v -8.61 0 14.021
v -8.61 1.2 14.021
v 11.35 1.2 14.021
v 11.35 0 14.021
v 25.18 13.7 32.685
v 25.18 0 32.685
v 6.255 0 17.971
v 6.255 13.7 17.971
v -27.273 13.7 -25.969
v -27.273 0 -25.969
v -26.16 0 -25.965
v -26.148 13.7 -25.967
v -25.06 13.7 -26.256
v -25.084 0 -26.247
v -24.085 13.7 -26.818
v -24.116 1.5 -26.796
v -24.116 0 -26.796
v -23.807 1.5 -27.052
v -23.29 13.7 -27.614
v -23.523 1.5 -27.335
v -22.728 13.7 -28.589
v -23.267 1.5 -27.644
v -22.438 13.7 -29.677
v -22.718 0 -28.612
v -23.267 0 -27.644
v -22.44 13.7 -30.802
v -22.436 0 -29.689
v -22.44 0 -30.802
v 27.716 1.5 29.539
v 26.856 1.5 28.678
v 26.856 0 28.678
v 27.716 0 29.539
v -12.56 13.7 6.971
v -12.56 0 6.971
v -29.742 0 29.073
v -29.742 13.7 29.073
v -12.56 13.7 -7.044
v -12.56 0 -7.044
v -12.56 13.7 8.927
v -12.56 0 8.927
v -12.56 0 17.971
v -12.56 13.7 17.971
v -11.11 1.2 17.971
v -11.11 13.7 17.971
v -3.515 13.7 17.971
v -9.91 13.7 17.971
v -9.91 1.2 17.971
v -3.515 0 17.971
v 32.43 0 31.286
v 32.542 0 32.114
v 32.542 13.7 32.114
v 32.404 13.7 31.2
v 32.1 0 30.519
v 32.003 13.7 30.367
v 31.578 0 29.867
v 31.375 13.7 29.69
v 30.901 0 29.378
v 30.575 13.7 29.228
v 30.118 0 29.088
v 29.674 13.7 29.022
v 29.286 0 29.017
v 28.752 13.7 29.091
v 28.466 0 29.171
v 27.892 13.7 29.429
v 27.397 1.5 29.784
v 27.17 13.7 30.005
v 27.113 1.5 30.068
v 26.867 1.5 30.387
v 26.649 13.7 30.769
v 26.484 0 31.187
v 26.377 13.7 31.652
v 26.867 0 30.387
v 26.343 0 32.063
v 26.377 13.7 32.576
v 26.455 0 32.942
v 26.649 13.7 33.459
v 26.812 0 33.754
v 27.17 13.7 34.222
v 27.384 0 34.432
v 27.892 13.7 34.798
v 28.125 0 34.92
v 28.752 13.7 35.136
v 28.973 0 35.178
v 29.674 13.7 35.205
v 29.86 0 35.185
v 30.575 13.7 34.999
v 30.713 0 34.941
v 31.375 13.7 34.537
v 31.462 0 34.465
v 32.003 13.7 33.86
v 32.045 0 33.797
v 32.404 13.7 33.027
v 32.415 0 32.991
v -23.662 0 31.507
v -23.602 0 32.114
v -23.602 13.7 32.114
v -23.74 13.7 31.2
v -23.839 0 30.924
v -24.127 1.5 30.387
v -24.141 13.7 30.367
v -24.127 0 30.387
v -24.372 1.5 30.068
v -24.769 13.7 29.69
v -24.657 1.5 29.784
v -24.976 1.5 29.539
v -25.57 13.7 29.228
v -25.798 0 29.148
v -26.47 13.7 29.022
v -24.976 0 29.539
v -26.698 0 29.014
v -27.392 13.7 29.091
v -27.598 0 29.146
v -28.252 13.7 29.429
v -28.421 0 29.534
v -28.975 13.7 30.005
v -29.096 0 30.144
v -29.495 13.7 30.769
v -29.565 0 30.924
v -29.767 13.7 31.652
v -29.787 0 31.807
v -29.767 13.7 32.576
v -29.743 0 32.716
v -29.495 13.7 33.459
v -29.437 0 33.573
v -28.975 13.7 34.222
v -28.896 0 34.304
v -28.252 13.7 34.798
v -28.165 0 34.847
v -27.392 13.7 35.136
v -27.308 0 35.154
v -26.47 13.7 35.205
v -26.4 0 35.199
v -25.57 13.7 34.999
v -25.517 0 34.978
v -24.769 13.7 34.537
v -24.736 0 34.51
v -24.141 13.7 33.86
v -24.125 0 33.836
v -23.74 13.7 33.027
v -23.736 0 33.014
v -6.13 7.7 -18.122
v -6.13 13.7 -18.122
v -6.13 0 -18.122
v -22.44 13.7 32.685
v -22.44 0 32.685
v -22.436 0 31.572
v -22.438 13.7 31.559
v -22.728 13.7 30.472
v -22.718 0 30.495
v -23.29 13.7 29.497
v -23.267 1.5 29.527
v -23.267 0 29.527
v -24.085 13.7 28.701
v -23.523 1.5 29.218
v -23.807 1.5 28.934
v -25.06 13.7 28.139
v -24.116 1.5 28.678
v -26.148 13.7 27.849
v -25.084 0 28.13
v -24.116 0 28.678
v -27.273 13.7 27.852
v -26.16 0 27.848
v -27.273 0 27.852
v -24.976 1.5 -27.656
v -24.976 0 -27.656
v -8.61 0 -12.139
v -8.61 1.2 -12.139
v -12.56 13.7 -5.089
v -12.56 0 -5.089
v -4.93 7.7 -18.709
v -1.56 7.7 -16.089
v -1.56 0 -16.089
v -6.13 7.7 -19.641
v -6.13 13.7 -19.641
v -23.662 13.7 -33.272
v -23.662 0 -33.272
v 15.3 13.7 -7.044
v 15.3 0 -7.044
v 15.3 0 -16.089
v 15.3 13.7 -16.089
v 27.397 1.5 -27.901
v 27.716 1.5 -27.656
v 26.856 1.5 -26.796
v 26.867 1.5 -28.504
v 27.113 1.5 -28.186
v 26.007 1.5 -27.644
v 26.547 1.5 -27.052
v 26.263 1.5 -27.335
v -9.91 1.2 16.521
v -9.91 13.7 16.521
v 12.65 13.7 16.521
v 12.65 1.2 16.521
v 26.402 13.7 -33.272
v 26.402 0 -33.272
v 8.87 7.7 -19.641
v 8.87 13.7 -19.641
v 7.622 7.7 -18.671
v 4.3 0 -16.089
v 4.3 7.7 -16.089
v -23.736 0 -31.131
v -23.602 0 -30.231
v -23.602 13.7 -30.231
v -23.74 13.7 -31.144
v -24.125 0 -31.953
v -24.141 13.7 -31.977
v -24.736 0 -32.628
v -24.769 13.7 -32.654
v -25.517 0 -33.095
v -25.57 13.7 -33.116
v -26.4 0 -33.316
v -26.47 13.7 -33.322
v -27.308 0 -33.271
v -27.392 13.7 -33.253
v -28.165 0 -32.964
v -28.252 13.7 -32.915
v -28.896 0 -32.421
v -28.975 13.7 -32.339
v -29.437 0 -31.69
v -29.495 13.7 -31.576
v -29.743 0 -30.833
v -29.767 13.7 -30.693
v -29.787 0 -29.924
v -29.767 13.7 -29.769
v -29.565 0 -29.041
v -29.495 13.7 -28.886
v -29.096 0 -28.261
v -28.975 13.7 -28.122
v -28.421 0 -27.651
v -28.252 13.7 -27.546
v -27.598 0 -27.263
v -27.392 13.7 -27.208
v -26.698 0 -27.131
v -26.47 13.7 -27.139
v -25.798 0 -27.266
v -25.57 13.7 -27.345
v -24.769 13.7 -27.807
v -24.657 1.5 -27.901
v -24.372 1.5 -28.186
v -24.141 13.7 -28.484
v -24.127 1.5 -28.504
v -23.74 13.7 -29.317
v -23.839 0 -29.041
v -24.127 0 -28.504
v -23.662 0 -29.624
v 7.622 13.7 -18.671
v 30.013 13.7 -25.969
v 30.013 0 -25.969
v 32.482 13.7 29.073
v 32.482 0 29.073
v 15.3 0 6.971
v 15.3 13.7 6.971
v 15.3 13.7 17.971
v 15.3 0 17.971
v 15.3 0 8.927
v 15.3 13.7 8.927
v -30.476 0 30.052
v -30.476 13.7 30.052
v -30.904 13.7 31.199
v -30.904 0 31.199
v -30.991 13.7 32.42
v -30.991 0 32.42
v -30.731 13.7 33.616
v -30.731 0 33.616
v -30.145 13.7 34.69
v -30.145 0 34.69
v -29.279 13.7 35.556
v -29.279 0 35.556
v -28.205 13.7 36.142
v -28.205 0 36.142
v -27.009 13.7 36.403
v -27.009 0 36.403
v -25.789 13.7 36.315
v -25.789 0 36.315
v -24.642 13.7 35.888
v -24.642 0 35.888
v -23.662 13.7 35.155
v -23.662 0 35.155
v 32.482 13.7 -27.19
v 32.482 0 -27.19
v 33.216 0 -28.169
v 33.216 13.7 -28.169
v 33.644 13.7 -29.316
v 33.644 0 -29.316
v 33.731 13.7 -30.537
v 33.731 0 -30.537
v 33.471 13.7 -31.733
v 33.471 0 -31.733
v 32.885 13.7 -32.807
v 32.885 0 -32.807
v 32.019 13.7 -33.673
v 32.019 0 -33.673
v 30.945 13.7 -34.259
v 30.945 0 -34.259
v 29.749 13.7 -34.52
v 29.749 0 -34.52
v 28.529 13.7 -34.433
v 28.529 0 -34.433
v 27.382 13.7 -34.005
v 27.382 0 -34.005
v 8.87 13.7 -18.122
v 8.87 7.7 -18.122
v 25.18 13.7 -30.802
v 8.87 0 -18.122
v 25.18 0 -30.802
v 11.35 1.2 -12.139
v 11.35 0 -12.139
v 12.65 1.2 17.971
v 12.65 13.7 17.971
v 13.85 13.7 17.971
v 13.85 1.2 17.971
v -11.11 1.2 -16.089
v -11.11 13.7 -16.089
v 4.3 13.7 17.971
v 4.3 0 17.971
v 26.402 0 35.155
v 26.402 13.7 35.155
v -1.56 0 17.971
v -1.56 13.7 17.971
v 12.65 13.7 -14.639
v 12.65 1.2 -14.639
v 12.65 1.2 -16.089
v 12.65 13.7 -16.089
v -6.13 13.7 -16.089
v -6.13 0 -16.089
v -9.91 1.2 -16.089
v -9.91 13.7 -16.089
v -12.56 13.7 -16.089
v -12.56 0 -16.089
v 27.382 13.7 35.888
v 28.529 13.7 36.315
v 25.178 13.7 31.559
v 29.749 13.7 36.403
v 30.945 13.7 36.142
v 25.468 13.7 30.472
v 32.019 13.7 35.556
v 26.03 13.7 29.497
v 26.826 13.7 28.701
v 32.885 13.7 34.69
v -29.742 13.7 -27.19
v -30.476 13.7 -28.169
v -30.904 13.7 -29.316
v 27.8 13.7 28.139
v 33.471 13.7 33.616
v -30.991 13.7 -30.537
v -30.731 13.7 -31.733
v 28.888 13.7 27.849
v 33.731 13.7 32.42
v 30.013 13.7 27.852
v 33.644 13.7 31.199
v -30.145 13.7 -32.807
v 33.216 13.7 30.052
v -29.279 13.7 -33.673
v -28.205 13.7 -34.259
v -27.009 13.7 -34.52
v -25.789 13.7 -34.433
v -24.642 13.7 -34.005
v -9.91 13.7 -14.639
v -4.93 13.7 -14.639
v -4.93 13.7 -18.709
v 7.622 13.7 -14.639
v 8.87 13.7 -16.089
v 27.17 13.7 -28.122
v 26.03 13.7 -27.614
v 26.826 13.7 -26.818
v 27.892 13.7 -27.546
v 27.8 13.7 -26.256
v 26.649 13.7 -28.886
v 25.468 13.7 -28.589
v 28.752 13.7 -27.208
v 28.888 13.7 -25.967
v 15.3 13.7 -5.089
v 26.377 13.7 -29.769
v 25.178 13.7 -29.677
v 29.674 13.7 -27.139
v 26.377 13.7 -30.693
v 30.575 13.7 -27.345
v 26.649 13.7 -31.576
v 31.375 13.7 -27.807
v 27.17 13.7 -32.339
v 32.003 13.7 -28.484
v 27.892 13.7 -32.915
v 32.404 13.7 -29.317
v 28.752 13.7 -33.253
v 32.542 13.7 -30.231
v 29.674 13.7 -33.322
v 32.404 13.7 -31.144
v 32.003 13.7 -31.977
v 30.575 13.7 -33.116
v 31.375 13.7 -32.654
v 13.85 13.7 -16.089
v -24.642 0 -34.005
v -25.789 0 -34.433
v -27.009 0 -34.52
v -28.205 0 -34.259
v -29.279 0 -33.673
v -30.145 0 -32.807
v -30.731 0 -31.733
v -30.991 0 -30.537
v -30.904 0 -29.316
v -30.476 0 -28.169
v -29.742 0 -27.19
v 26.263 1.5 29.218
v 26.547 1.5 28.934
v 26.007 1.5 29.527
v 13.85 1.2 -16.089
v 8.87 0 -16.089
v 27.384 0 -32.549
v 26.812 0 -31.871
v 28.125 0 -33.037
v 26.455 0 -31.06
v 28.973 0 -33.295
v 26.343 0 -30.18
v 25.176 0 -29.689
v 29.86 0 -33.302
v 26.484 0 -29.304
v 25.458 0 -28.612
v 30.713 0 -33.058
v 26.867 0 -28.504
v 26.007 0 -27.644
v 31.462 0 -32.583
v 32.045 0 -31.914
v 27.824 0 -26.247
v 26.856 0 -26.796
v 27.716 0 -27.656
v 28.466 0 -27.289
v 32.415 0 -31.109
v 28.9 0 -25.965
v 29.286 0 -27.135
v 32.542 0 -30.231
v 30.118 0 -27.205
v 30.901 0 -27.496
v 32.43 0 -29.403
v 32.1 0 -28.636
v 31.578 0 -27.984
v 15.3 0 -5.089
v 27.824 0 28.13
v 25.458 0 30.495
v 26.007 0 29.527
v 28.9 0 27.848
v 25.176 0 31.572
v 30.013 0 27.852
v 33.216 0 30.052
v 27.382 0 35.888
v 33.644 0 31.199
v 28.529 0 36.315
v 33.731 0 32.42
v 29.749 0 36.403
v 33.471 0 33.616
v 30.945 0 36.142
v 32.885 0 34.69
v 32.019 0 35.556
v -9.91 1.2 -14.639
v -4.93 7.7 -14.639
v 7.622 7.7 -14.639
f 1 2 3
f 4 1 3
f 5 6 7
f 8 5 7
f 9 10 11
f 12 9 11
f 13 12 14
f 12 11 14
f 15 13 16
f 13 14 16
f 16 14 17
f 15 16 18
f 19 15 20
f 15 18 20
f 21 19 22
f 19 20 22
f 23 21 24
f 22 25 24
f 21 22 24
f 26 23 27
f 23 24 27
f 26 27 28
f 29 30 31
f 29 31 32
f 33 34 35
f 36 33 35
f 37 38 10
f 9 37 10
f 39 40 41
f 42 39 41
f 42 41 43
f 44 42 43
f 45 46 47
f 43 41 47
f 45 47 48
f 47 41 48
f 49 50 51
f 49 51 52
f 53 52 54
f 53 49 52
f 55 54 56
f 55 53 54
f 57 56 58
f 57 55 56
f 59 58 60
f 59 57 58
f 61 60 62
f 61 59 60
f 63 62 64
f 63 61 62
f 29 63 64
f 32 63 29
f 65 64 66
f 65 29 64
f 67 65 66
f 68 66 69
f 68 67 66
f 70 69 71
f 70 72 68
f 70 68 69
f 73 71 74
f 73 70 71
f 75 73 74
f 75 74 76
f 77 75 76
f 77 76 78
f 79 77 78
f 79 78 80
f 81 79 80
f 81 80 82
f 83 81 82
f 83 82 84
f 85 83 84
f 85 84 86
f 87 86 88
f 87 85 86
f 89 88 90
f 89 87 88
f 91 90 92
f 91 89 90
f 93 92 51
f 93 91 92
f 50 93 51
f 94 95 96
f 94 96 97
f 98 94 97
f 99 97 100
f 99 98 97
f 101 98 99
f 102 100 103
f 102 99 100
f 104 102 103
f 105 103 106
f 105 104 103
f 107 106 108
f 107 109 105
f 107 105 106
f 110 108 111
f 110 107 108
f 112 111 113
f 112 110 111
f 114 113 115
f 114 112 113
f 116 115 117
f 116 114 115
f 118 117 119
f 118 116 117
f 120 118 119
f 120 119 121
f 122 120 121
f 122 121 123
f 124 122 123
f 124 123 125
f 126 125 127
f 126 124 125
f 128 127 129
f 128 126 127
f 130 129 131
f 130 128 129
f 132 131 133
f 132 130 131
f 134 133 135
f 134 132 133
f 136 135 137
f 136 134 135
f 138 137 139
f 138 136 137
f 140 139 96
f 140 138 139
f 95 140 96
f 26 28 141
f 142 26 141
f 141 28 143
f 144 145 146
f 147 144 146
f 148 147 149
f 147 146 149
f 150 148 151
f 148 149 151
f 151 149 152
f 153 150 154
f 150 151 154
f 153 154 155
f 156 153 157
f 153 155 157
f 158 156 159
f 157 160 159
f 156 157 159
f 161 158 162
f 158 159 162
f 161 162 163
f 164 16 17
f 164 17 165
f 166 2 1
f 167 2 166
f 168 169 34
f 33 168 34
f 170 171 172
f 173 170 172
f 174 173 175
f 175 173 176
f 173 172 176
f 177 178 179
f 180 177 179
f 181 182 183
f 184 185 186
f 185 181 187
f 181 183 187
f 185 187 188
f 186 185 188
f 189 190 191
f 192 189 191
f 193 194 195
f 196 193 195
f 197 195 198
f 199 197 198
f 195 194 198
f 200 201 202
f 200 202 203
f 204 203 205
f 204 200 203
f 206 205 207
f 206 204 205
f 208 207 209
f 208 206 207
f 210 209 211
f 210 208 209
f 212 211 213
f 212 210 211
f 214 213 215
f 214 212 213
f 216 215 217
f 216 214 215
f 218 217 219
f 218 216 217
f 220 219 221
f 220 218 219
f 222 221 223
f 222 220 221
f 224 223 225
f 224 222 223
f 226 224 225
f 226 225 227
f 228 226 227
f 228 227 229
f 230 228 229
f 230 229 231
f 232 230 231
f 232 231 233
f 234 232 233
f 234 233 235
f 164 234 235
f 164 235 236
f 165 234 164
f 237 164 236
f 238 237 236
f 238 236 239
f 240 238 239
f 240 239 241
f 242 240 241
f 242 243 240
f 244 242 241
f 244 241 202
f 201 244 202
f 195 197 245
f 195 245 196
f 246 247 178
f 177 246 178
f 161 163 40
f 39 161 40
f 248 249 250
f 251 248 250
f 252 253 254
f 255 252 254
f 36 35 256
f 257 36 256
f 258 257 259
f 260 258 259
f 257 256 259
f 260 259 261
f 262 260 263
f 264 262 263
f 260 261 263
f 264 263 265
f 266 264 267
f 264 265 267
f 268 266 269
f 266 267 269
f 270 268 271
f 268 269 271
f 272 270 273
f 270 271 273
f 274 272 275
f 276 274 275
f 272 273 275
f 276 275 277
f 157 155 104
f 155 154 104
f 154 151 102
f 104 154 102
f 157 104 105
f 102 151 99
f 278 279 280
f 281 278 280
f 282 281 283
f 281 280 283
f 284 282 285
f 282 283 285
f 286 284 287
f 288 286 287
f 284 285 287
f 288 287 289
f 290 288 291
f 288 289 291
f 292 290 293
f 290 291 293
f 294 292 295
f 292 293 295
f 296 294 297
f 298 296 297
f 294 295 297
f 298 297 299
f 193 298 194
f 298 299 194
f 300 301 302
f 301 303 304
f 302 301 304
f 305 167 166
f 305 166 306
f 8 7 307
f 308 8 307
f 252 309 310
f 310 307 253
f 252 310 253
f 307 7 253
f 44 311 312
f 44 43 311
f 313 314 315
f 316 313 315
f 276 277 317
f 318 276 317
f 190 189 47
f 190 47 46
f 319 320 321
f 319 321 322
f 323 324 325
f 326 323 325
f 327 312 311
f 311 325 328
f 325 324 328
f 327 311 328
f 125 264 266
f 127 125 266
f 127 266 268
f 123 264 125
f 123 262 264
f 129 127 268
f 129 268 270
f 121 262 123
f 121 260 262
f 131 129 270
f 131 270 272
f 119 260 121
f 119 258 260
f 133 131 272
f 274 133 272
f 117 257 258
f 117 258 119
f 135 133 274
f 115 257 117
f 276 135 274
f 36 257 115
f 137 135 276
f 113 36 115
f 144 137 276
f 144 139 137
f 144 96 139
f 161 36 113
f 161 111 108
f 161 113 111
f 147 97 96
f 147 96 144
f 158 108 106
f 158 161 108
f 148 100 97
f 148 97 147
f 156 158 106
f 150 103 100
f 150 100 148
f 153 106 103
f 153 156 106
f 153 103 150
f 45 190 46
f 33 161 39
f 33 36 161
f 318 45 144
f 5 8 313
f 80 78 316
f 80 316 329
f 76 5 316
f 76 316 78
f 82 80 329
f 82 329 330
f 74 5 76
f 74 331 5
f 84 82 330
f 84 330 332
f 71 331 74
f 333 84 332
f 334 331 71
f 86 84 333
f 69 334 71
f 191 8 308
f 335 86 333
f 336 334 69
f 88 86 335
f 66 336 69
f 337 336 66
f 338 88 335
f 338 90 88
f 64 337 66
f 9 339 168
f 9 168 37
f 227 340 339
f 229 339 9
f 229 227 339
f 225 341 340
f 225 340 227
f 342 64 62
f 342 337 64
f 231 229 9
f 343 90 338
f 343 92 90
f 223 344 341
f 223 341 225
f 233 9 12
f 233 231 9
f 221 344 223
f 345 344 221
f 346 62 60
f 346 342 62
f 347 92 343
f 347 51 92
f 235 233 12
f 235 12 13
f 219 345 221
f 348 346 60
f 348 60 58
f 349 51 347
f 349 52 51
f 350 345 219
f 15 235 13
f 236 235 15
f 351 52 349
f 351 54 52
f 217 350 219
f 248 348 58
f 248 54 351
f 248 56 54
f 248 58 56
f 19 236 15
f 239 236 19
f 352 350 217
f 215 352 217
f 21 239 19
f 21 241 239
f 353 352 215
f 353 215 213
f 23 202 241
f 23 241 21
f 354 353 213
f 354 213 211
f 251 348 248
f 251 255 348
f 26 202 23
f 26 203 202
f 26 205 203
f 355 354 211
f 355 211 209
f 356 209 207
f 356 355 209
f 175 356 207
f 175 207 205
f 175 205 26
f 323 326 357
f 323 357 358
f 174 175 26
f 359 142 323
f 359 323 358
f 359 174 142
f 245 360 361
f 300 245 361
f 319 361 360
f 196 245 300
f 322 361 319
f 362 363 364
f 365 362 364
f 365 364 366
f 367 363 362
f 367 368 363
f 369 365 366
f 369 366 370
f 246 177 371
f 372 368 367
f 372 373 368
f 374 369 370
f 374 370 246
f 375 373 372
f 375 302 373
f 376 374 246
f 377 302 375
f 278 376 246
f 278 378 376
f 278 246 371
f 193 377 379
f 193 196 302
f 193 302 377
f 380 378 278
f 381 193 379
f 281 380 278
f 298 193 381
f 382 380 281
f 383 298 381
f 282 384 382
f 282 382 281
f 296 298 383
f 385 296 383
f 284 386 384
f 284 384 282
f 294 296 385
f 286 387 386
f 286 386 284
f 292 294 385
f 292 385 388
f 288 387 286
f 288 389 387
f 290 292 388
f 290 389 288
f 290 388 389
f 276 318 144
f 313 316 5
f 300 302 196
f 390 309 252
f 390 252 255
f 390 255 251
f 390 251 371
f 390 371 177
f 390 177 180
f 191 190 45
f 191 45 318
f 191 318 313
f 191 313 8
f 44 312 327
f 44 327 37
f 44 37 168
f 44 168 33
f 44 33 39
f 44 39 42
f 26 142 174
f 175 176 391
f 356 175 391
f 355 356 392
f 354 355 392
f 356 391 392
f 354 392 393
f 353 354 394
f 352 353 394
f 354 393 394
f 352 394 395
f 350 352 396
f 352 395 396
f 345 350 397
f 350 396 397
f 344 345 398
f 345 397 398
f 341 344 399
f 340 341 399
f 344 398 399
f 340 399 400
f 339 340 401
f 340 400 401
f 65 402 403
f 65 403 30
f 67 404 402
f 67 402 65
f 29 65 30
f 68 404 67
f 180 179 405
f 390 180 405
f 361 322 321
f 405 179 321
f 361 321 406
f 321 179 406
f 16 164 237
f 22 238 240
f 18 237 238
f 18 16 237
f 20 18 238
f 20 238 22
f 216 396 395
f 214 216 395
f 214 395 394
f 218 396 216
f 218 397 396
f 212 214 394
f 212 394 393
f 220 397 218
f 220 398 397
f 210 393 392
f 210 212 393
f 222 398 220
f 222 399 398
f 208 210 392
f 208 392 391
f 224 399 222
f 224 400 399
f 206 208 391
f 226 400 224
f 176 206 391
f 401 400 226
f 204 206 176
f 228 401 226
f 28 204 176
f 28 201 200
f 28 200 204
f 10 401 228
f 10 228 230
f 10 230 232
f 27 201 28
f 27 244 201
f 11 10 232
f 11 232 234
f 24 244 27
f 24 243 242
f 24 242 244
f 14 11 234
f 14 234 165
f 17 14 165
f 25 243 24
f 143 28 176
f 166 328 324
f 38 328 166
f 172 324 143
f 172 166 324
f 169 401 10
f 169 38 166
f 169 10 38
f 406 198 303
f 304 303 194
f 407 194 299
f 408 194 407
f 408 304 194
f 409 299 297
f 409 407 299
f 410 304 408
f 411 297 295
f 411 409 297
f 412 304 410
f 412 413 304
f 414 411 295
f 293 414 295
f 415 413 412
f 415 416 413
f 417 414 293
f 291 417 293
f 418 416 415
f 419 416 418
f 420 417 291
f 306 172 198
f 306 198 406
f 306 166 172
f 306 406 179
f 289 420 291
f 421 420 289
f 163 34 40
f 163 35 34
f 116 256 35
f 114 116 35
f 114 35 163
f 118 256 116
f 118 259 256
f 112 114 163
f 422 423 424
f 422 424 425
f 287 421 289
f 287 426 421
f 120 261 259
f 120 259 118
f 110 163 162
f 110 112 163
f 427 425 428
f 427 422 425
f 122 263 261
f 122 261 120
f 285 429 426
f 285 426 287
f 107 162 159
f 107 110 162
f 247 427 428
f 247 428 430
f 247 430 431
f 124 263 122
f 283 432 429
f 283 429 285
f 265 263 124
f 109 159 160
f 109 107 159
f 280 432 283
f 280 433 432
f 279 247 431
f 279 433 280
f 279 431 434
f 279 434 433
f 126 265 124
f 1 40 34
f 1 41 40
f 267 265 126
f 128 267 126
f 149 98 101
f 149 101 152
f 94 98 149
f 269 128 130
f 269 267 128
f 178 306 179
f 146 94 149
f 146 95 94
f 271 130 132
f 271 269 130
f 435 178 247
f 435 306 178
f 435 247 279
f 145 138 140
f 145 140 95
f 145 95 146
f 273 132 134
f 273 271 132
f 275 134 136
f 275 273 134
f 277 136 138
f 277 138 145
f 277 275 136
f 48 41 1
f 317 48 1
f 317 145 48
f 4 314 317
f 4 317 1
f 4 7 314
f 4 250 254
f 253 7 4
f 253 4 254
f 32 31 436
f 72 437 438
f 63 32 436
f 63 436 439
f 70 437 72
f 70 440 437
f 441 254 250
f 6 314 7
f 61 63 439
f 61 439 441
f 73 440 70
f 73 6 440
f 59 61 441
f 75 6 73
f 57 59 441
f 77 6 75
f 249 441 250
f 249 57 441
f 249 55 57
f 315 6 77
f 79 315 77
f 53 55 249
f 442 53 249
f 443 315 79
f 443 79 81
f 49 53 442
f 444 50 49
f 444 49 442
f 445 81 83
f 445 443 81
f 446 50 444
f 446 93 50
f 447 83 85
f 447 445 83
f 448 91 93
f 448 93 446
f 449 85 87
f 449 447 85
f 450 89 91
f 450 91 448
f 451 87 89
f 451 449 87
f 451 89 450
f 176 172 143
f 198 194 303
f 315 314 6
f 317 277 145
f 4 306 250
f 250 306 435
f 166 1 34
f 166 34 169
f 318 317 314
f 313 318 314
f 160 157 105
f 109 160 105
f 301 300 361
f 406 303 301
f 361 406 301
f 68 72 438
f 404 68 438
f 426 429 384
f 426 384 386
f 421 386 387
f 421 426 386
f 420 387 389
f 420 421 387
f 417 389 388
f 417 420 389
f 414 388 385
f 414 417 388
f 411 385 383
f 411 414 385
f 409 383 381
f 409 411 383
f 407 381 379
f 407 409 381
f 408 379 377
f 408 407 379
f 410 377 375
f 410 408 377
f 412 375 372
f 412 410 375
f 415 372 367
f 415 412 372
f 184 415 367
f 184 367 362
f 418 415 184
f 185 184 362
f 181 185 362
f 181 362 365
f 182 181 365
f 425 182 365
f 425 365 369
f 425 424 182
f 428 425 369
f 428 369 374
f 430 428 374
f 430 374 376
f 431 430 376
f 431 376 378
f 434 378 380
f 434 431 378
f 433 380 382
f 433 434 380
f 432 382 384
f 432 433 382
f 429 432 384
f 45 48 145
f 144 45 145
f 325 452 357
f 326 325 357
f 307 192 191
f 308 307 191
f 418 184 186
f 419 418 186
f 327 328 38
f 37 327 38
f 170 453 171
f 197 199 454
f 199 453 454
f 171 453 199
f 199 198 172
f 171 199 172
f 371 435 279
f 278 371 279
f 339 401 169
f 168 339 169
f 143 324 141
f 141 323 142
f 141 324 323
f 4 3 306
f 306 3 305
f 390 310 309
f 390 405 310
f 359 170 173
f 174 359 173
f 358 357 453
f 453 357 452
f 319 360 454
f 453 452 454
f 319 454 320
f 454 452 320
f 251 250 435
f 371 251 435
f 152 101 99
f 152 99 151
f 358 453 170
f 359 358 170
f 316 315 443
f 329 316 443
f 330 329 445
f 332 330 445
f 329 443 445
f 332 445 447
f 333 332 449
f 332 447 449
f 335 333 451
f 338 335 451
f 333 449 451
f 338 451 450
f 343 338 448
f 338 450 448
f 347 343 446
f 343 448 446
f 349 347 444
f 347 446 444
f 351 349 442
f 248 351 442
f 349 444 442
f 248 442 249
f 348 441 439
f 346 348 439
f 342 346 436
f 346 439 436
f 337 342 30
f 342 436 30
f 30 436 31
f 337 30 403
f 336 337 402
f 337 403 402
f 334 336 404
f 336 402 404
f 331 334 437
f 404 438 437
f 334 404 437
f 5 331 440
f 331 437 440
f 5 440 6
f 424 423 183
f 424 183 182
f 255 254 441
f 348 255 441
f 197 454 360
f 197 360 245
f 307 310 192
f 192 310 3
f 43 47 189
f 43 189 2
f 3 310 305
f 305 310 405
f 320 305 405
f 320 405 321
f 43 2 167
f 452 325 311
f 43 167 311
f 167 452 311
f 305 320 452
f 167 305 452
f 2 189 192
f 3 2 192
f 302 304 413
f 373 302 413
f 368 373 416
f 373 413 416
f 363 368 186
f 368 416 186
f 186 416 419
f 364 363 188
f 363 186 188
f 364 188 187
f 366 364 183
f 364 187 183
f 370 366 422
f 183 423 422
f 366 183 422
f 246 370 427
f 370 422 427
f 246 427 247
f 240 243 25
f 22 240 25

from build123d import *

# Parameters (mm, degrees)
SKETCH1_R           = 3.1
BOSS_EXTRUDE4_DEPTH = 13.7
SKETCH6_W           = 24.96
SKETCH6_H           = 31.16
CUT_EXTRUDE1_DEPTH  = 12.5
SKETCH7_W           = 19.96
SKETCH7_H           = 26.16
CUT_EXTRUDE2_DEPTH  = 12.5
SKETCH9_W           = 1.2
SKETCH9_H           = 12.5
CUT_EXTRUDE3_DEPTH  = 1.45
SKETCH10_W          = 1.2
SKETCH10_H          = 12.5
CUT_EXTRUDE4_DEPTH  = 1.45
CUT_EXTRUDE5_DEPTH  = 1.5
SKETCH12_W          = 7.5
SKETCH12_H          = 6
CUT_EXTRUDE6_DEPTH  = 20.892135624
BOSS_EXTRUDE5_DEPTH = 6
BOSS_EXTRUDE6_DEPTH = 7.7


with BuildPart() as part:
    # Sketch1 → Boss-Extrude4 (new body)
    with BuildSketch(Plane(origin=(0, 0, 0), x_dir=(1, 0, 0), z_dir=(0, 1, 0))):
        with BuildLine():
            Line((-1.559985024, 16.088570711), (-23.661955043, 33.271658997))
            ThreePointArc((-23.661955043, 33.271658997), (-29.74307331, 33.27087194), (-29.742286254, 27.189753673))
            Line((-29.742286254, 27.189753673), (-12.559985024, 5.088570711))
            Line((-12.559985024, 5.088570711), (-12.559985024, -6.971429289))
            Line((-12.559985024, -6.971429289), (-29.742286254, -29.072612251))
            ThreePointArc((-29.742286254, -29.072612251), (-29.74307331, -35.153730518), (-23.661955043, -35.154517574))
            Line((-23.661955043, -35.154517574), (-1.559985024, -17.971429289))
            Line((-1.559985024, -17.971429289), (4.300014976, -17.971429289))
            Line((4.300014976, -17.971429289), (26.401984994, -35.154517574))
            ThreePointArc((26.401984994, -35.154517574), (32.483103261, -35.153730518), (32.482316205, -29.072612251))
            Line((32.482316205, -29.072612251), (15.300014976, -6.971429289))
            Line((15.300014976, -6.971429289), (15.300014976, 5.088570711))
            Line((15.300014976, 5.088570711), (32.482316205, 27.189753673))
            ThreePointArc((32.482316205, 27.189753673), (32.483103261, 33.27087194), (26.401984994, 33.271658997))
            Line((26.401984994, 33.271658997), (4.300014976, 16.088570711))
            Line((4.300014976, 16.088570711), (-1.559985024, 16.088570711))
        make_face()
        with BuildLine():
            Line((15.300014976, -17.971429289), (15.300014976, -8.926547914))
            Line((15.300014976, -8.926547914), (30.013101167, -27.851638652))
            ThreePointArc((30.013101167, -27.851638652), (26.40152787, -29.073069325), (25.180248217, -32.684693693))
            Line((25.180248217, -32.684693693), (6.255121178, -17.971429289))
            Line((6.255121178, -17.971429289), (15.300014976, -17.971429289))
        make_face(mode=Mode.SUBTRACT)
        with Locations((-26.702120648, -32.113564912)):
            Circle(SKETCH1_R, mode=Mode.SUBTRACT)
        with BuildLine():
            Line((-12.559985024, -8.926547914), (-12.559985024, -17.971429289))
            Line((-12.559985024, -17.971429289), (-3.515091227, -17.971429289))
            Line((-3.515091227, -17.971429289), (-22.440218266, -32.684693693))
            ThreePointArc((-22.440218266, -32.684693693), (-23.661497919, -29.073069325), (-27.273071216, -27.851638652))
            Line((-27.273071216, -27.851638652), (-12.559985024, -8.926547914))
        make_face(mode=Mode.SUBTRACT)
        with BuildLine():
            Line((-3.515091227, 16.088570711), (-12.559985024, 16.088570711))
            Line((-12.559985024, 16.088570711), (-12.559985024, 7.043689336))
            Line((-12.559985024, 7.043689336), (-27.273071216, 25.968780075))
            ThreePointArc((-27.273071216, 25.968780075), (-23.661497919, 27.190210747), (-22.440218266, 30.801835115))
            Line((-22.440218266, 30.801835115), (-3.515091227, 16.088570711))
        make_face(mode=Mode.SUBTRACT)
        with Locations((-26.702120648, 30.230706335)):
            Circle(SKETCH1_R, mode=Mode.SUBTRACT)
        with BuildLine():
            Line((15.300014976, 7.043689336), (15.300014976, 16.088570711))
            Line((15.300014976, 16.088570711), (6.255121178, 16.088570711))
            Line((6.255121178, 16.088570711), (25.180248217, 30.801835115))
            ThreePointArc((25.180248217, 30.801835115), (26.40152787, 27.190210747), (30.013101167, 25.968780075))
            Line((30.013101167, 25.968780075), (15.300014976, 7.043689336))
        make_face(mode=Mode.SUBTRACT)
        with Locations((29.442150599, 30.230706335)):
            Circle(SKETCH1_R, mode=Mode.SUBTRACT)
        with Locations((29.442150599, -32.113564912)):
            Circle(SKETCH1_R, mode=Mode.SUBTRACT)
    extrude(amount=BOSS_EXTRUDE4_DEPTH)

    # Sketch6 → Cut-Extrude1 (cut)
    with BuildSketch(Plane(origin=(0, 13.7, 0), x_dir=(1, 0, 0), z_dir=(0, 1, 0))):
        with Locations((1.370014976, -0.941429289)):
            Rectangle(SKETCH6_W, SKETCH6_H)
    extrude(amount=-CUT_EXTRUDE1_DEPTH, mode=Mode.SUBTRACT)

    # Sketch7 → Cut-Extrude2 (cut)
    with BuildSketch(Plane(origin=(0, 1.2, 0), x_dir=(1, 0, 0), z_dir=(0, 1, 0))):
        with Locations((1.370014976, -0.941429289)):
            Rectangle(SKETCH7_W, SKETCH7_H)
    extrude(amount=-CUT_EXTRUDE2_DEPTH, mode=Mode.SUBTRACT)

    # Sketch9 → Cut-Extrude3 (cut)
    with BuildSketch(Plane.XY.offset(-14.638570711)):
        with Locations((-10.509985024, 7.45)):
            Rectangle(SKETCH9_W, SKETCH9_H)
        with Locations((13.250014976, 7.45)):
            Rectangle(SKETCH9_W, SKETCH9_H)
    extrude(amount=-CUT_EXTRUDE3_DEPTH, mode=Mode.SUBTRACT)

    # Sketch10 → Cut-Extrude4 (cut)
    with BuildSketch(Plane(origin=(0, 0, 16.521429289), x_dir=(-1, 0, 0), z_dir=(0, 0, -1))):
        with Locations((-13.250014976, 7.45)):
            Rectangle(SKETCH10_W, SKETCH10_H)
        with Locations((10.509985024, 7.45)):
            Rectangle(SKETCH10_W, SKETCH10_H)
    extrude(amount=-CUT_EXTRUDE4_DEPTH, mode=Mode.SUBTRACT)

    # Sketch11 → Cut-Extrude5 (cut)
    with BuildSketch(Plane.XZ):
        Polygon((-26.881022326, -29.561079875), (-26.032494188, -30.409608013), (-22.146132163, -26.523245987), (-22.9946603, -25.67471785), align=None)
        Polygon((24.886162114, -26.523245987), (25.734690251, -25.67471785), (29.621052277, -29.561079875), (28.772524139, -30.409608013), align=None)
        Polygon((29.621052277, 31.443938453), (28.772524139, 32.29246659), (24.886162114, 28.406104565), (25.734690251, 27.557576427), align=None)
        Polygon((-22.146132163, 28.406104565), (-22.9946603, 27.557576427), (-26.881022326, 31.443938453), (-26.032494188, 32.29246659), align=None)
    extrude(amount=-CUT_EXTRUDE5_DEPTH, mode=Mode.SUBTRACT)

    # Sketch12 → Cut-Extrude6 (cut, through all)
    with BuildSketch(Plane.XY.offset(-14.638570711)):
        with Locations((-2.379985024, 10.7)):
            Rectangle(SKETCH12_W, SKETCH12_H)
        with Locations((5.120014976, 10.7)):
            Rectangle(SKETCH12_W, SKETCH12_H)
    extrude(amount=-CUT_EXTRUDE6_DEPTH, mode=Mode.SUBTRACT)

    # Sketch14 → Boss-Extrude5 (add)
    with BuildSketch(Plane(origin=(0, 7.7, 0), x_dir=(1, 0, 0), z_dir=(0, 1, 0))):
        Polygon((-6.129985024, 19.641498953), (-6.129985024, 14.638570711), (-4.929985024, 14.638570711), (-4.929985024, 18.708563747), align=None)
        Polygon((8.870014976, 19.641498953), (8.870014976, 14.638570711), (7.62204126, 14.638570711), (7.62204126, 18.671266773), align=None)
    extrude(amount=BOSS_EXTRUDE5_DEPTH)

    # Sketch15 → Boss-Extrude6 (add)
    with BuildSketch(Plane.XZ.offset(-7.7)):
        Polygon((-6.129985024, -16.088570711), (-6.129985024, -18.121509447), (-3.515091227, -16.088570711), align=None)
        Polygon((8.870014976, -16.088570711), (8.870014976, -18.121509447), (6.255121178, -16.088570711), align=None)
    extrude(amount=BOSS_EXTRUDE6_DEPTH)


solid = part.part
